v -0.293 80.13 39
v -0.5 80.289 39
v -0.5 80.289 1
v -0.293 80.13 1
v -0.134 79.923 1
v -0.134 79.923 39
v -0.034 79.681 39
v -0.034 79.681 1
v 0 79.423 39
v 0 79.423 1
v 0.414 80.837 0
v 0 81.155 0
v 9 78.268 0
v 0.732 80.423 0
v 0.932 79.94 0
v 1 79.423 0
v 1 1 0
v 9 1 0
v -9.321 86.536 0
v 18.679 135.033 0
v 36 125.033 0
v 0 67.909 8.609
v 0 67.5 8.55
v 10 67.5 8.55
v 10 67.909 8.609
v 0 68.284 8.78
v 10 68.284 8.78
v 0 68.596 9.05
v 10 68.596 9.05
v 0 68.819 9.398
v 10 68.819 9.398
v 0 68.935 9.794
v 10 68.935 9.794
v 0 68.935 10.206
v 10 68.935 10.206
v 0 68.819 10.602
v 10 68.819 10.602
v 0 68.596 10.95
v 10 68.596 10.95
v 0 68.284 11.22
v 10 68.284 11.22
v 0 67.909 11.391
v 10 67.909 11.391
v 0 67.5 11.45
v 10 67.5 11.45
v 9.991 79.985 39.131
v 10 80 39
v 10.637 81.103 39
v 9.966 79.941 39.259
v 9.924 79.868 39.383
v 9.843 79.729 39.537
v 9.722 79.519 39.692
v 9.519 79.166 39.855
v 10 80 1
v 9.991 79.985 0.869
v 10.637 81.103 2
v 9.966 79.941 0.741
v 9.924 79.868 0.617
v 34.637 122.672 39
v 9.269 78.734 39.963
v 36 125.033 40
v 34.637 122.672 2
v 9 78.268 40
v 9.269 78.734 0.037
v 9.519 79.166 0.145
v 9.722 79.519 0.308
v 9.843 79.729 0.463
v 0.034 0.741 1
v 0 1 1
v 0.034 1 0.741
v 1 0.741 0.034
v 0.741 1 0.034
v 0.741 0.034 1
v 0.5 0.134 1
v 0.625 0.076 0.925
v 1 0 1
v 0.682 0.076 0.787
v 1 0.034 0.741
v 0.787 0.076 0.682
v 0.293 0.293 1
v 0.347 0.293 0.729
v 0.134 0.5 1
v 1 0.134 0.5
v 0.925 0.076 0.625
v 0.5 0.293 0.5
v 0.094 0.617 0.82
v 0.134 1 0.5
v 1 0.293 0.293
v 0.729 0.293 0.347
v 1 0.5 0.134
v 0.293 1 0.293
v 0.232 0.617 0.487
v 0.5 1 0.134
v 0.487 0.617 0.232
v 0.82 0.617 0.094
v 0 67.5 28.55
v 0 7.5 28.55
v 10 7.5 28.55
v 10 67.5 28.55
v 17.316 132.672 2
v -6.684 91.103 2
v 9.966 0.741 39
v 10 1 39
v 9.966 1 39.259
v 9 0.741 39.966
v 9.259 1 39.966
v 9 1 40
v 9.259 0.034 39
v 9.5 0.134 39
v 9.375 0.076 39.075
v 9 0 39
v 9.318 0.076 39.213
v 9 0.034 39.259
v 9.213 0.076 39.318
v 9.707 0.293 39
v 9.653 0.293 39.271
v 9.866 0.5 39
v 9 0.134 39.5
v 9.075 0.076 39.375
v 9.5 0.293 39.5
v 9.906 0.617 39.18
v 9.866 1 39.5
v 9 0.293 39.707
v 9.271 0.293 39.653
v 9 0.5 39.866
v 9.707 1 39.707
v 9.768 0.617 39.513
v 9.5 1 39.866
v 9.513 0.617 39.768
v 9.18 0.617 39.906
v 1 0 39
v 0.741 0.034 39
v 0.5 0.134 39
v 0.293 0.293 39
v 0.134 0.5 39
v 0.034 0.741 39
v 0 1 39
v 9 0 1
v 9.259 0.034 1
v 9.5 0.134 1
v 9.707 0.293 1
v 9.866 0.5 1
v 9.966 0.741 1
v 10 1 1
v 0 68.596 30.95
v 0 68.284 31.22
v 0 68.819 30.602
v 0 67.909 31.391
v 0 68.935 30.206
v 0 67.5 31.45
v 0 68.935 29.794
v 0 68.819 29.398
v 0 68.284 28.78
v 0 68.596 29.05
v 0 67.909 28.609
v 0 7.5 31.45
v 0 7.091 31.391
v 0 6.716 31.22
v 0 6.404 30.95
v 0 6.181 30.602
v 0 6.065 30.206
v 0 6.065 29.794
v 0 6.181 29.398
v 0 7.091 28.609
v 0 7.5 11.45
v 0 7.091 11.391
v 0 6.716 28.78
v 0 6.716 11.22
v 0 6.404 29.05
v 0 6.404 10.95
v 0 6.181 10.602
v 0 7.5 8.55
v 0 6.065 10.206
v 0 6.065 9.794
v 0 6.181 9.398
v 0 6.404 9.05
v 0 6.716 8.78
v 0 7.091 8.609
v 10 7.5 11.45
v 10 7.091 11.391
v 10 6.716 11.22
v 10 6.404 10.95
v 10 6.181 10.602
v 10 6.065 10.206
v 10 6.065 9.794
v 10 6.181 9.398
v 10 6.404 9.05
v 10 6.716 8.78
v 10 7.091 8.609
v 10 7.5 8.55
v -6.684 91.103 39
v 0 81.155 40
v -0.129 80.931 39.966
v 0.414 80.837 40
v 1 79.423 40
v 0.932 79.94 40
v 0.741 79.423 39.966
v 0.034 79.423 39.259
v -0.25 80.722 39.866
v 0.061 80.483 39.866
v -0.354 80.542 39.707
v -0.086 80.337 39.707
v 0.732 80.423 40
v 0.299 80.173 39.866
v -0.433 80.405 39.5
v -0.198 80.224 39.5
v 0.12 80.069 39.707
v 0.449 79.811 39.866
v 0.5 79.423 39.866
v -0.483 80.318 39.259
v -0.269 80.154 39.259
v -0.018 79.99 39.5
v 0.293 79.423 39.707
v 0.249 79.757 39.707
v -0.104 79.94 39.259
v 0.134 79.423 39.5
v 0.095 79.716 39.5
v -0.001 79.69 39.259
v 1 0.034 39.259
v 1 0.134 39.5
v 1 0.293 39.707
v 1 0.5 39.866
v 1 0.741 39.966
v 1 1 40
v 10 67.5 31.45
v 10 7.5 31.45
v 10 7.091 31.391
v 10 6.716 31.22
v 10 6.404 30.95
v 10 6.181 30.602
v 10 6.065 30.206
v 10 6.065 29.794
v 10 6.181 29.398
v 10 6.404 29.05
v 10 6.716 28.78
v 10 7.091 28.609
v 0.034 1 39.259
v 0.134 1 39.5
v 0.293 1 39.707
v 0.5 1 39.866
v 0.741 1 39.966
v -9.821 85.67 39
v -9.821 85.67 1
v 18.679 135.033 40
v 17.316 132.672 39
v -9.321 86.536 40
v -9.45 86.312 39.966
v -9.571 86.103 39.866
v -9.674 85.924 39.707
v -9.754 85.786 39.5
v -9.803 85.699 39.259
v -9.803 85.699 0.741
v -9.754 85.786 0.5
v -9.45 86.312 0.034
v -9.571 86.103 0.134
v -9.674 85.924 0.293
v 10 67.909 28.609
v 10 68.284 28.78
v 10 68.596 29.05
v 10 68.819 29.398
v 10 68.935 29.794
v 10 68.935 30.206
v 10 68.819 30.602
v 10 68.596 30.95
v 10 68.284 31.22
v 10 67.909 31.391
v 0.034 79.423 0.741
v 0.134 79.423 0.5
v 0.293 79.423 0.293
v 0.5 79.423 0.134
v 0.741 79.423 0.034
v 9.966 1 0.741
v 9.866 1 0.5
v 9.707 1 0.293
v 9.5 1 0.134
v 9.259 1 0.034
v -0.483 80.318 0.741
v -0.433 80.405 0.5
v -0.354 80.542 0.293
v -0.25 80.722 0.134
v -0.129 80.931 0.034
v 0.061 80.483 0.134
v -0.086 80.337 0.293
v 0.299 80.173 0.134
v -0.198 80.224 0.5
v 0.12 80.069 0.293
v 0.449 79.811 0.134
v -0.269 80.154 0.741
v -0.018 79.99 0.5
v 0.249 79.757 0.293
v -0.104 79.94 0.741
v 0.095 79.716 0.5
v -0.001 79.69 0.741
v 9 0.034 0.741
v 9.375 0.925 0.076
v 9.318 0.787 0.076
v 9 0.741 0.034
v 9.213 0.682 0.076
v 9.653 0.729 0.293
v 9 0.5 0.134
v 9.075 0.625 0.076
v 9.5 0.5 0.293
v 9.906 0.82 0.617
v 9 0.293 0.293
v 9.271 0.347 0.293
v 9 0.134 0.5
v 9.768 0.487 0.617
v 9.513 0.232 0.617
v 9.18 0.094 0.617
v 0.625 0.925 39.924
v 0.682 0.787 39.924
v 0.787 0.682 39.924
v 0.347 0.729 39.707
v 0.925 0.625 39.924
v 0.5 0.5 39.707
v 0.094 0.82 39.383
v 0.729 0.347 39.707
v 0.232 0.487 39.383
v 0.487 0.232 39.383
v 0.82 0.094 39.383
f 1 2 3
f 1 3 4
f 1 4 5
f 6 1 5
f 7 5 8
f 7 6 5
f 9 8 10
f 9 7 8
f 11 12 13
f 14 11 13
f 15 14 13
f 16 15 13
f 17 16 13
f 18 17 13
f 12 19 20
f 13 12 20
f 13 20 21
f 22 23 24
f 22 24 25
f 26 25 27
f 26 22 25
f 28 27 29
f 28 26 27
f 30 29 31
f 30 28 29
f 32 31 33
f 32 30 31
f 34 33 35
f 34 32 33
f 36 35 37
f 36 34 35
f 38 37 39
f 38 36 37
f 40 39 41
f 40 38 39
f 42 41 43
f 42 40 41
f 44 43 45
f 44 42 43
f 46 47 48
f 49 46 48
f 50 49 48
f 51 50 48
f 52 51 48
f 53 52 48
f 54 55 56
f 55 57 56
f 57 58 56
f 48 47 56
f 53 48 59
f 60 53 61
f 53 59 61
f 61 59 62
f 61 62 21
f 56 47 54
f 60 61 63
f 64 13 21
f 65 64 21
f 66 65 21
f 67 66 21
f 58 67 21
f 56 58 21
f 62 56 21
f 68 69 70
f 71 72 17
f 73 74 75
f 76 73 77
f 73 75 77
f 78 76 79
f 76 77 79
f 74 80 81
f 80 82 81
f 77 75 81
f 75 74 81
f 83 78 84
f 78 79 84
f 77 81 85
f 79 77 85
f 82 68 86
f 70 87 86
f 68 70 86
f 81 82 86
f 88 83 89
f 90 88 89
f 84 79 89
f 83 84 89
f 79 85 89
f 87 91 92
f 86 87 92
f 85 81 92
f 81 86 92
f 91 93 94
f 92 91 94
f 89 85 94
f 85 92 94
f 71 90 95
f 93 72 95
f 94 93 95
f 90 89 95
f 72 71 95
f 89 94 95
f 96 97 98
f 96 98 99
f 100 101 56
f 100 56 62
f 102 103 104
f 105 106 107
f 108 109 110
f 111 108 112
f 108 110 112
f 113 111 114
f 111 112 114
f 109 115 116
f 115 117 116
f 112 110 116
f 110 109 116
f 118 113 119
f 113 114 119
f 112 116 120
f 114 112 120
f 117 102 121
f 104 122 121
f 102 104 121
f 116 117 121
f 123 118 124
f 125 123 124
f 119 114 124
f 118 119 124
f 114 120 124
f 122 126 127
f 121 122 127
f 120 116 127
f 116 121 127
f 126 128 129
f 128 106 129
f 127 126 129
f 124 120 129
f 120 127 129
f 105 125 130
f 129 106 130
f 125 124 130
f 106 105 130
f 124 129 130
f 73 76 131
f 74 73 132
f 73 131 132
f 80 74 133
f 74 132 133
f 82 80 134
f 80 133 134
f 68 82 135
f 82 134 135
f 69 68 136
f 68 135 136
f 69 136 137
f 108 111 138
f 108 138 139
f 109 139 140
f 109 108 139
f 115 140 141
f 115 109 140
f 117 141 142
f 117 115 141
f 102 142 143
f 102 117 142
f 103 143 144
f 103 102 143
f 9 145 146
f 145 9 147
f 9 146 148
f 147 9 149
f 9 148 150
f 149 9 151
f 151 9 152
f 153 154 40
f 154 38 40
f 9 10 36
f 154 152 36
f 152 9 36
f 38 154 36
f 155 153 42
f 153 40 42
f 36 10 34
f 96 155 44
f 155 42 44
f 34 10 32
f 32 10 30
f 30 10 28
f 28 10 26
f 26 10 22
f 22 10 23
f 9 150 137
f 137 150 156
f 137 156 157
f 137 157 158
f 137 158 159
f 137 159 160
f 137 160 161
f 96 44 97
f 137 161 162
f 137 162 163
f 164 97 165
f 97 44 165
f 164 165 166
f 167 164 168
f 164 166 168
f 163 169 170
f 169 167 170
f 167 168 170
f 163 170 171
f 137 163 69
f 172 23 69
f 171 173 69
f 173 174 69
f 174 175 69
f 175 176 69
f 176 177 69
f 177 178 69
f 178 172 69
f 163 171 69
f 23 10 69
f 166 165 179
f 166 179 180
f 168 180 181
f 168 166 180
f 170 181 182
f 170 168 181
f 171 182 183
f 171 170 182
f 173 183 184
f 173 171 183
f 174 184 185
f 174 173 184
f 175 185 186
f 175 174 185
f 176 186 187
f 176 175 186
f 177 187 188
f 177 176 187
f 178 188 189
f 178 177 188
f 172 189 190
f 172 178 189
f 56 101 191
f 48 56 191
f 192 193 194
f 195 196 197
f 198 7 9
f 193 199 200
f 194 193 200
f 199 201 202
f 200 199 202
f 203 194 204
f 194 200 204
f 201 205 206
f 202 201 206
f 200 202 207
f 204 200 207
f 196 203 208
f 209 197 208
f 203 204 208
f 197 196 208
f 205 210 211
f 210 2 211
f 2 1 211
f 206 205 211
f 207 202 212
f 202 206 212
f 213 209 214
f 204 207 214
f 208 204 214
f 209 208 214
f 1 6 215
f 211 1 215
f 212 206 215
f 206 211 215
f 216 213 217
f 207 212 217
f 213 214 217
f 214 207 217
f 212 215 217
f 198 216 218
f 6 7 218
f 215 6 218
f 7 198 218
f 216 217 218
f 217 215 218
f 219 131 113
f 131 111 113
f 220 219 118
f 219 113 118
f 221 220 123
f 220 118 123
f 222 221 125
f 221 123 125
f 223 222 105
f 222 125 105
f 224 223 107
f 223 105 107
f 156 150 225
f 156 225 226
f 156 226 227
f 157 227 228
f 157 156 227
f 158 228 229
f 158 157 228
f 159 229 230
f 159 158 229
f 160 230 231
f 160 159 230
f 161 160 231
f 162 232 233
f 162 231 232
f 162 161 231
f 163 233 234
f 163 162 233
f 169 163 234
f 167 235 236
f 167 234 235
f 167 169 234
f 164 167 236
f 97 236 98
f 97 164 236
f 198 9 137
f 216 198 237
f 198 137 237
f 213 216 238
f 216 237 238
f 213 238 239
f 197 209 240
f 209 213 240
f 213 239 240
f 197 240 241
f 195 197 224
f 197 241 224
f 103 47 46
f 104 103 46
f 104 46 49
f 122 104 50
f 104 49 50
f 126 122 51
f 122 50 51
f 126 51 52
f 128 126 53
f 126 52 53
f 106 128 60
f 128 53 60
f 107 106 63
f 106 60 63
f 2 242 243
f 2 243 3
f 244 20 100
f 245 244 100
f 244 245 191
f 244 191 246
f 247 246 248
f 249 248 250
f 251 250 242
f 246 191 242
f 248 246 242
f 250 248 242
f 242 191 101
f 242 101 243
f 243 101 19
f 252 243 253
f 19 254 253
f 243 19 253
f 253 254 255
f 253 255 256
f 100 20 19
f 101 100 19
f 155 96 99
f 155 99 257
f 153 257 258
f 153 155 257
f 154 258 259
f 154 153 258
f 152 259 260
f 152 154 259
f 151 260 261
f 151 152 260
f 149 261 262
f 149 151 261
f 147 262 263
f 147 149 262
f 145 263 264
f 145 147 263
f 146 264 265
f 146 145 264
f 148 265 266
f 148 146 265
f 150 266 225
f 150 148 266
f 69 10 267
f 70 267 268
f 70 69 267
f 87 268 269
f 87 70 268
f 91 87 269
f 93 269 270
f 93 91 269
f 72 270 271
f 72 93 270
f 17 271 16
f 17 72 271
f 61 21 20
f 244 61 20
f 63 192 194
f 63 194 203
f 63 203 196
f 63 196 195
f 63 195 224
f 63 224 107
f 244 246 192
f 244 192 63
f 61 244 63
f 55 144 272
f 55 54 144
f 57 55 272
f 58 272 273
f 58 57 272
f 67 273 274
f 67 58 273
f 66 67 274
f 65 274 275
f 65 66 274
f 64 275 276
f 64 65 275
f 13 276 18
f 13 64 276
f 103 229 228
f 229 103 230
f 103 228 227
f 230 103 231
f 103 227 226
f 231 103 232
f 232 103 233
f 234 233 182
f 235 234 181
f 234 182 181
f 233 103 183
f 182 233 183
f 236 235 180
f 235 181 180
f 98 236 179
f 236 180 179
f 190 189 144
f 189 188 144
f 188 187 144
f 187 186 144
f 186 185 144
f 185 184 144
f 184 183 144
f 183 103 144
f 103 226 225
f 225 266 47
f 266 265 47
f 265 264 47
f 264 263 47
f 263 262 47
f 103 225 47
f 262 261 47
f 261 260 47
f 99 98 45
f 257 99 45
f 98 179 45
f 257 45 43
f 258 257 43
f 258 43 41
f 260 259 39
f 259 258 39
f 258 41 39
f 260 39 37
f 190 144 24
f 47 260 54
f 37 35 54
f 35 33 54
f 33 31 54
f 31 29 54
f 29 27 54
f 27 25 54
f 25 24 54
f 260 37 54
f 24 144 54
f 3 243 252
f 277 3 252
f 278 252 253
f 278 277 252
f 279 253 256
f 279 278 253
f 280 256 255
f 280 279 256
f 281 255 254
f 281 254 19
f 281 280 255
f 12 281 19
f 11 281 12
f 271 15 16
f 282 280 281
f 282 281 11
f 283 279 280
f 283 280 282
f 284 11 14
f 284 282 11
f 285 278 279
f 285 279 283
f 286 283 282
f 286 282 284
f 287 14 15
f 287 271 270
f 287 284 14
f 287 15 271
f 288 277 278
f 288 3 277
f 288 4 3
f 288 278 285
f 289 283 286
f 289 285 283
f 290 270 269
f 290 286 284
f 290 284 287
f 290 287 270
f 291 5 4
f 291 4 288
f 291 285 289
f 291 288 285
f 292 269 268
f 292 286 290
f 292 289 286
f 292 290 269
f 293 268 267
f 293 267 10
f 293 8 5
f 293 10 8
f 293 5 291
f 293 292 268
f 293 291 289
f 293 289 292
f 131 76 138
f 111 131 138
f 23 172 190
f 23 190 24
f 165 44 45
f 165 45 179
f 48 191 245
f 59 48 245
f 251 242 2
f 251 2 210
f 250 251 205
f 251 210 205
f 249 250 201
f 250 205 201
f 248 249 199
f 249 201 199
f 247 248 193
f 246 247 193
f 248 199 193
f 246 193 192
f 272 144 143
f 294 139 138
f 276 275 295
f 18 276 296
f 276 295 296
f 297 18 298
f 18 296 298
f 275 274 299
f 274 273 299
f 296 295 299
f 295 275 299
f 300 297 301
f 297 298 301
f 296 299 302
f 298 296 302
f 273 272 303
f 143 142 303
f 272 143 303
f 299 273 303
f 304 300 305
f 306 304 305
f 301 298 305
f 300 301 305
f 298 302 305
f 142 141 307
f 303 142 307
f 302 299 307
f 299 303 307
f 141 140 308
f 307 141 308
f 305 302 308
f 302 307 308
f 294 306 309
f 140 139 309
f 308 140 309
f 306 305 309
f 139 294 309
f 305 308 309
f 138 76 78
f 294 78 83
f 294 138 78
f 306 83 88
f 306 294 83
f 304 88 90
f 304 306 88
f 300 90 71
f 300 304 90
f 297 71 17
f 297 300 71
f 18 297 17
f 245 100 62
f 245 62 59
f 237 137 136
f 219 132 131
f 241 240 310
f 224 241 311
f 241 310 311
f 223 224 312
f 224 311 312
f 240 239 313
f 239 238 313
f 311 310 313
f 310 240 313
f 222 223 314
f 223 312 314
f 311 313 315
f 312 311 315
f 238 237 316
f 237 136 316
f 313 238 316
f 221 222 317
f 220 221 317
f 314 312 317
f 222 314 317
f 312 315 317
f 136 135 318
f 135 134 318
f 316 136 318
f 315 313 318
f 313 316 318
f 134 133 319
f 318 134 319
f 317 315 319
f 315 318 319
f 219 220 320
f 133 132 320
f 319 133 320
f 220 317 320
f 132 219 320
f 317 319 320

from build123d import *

# Parameters (mm, degrees)
BOSS_EXTRU_1_DEPTH      = 40
CONG_2_R                = 1
ENL_V_MAT_EXTRU_4_REACH = 147.362
ESQUISSE14_W            = 37
ESQUISSE14_H            = 48
ENL_V_MAT_EXTRU_5_DEPTH = 20


with BuildPart() as part:
    # Esquisse1 → Boss.-Extru.1 (new body)
    with BuildSketch(Plane.XY):
        Polygon((0, 0), (10, 0), (10, 80), (36, 125.033320997), (18.679491924, 135.033320997), (-9.820508076, 85.669872981), (0, 80), align=None)
    extrude(amount=BOSS_EXTRU_1_DEPTH)

    # Congé2
    cong_2_edges = [part.edges().sort_by_distance(p)[0] for p in [
        (0, 40, 0),
        (0, 80, 20),
        (10, 40, 40),
        (10, 0, 20),
        (0, 0, 20),
        (-4.910254038, 82.834936491, 40),
        (0, 40, 40),
        (-4.910254038, 82.834936491, 0),
        (5, 0, 40),
        (10, 40, 0),
        (5, 0, 0),
    ]]
    fillet(cong_2_edges, radius=CONG_2_R)

    # Esquisse13 → Enlèv. mat.-Extru.4 (cut, up to next)
    with BuildSketch(Plane.ZY, mode=Mode.PRIVATE) as enl_v_mat_extru_4_sk1:
        with BuildLine():
            Line((8.55, 7.5), (8.55, 67.5))
            ThreePointArc((8.55, 67.5), (10, 68.95), (11.45, 67.5))
            Line((11.45, 67.5), (11.45, 7.5))
            ThreePointArc((11.45, 7.5), (10, 6.05), (8.55, 7.5))
        make_face()
    enl_v_mat_extru_4_tool1 = extrude(enl_v_mat_extru_4_sk1.sketch, amount=-ENL_V_MAT_EXTRU_4_REACH, mode=Mode.PRIVATE) & part.part
    # Esquisse13 → Enlèv. mat.-Extru.4 (cut, up to next)
    with BuildSketch(Plane.ZY, mode=Mode.PRIVATE) as enl_v_mat_extru_4_sk2:
        with BuildLine():
            Line((28.55, 7.5), (28.55, 67.5))
            ThreePointArc((28.55, 67.5), (30, 68.95), (31.45, 67.5))
            Line((31.45, 67.5), (31.45, 7.5))
            ThreePointArc((31.45, 7.5), (30, 6.05), (28.55, 7.5))
        make_face()
    enl_v_mat_extru_4_tool2 = extrude(enl_v_mat_extru_4_sk2.sketch, amount=-ENL_V_MAT_EXTRU_4_REACH, mode=Mode.PRIVATE) & part.part
    add(enl_v_mat_extru_4_tool1.solids().sort_by_distance((0, 37.5, 10))[0], mode=Mode.SUBTRACT)
    add(enl_v_mat_extru_4_tool2.solids().sort_by_distance((0, 37.5, 30))[0], mode=Mode.SUBTRACT)

    # Esquisse14 → Enlèv. mat.-Extru.5 (cut)
    with BuildSketch(Plane(origin=(-44.461524227, 25.669872981, 0), x_dir=(0, 0, 1), z_dir=(-0.8660254037844419, 0.4999999999999945, 0))):
        with Locations((20.5, 99.55560496)):
            Rectangle(ESQUISSE14_W, ESQUISSE14_H)
    extrude(amount=-ENL_V_MAT_EXTRU_5_DEPTH, mode=Mode.SUBTRACT)


solid = part.part
